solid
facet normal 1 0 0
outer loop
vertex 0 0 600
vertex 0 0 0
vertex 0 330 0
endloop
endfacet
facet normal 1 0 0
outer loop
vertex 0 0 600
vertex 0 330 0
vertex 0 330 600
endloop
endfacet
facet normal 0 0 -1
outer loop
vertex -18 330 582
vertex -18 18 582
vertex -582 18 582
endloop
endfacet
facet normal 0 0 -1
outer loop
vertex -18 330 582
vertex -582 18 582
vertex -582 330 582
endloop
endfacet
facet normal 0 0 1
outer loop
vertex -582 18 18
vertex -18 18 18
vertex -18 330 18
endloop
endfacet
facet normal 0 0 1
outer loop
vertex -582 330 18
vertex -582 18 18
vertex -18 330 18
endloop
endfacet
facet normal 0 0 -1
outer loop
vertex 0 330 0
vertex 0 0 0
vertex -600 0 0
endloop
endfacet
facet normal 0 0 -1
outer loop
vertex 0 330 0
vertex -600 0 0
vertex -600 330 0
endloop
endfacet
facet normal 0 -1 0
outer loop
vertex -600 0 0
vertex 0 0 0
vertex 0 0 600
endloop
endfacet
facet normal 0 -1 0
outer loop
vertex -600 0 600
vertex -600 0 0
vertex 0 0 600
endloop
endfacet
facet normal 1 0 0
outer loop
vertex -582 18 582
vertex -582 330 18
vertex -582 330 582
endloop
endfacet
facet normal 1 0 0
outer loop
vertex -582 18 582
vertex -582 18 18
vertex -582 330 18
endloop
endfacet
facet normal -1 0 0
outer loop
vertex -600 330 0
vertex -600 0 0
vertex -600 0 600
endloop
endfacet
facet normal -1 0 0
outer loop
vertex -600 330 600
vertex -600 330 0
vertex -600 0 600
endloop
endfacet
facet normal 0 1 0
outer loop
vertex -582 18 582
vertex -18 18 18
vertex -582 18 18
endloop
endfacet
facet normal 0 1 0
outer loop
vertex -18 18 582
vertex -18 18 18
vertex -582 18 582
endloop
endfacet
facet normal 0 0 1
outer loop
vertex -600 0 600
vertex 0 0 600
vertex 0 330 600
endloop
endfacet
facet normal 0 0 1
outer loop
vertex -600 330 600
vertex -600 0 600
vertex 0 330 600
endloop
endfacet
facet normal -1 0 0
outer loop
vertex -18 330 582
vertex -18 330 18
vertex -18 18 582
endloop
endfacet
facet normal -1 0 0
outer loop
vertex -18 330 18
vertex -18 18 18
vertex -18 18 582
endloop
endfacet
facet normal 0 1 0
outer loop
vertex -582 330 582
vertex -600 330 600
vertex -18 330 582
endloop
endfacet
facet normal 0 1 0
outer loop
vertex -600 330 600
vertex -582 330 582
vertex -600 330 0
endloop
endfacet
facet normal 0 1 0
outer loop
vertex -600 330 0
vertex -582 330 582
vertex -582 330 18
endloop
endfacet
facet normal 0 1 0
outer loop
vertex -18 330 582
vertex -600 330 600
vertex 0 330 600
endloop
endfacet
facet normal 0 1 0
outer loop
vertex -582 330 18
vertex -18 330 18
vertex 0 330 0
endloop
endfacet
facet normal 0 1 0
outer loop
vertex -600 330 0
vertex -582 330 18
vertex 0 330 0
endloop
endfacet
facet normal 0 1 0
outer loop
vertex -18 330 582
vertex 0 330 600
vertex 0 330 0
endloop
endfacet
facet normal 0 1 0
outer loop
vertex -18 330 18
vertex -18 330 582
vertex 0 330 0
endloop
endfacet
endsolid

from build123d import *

# Parameters (mm, degrees)
F0_W     = 52.5068640709
F0_H     = 35.3771150112
F1_DEPTH = 330
F2_DEPTH = 600
F3_DEPTH = 600
F4_T     = -18


with BuildPart() as f1:
    # F0 (on Front) → F1 (new body)
    with BuildSketch(Plane.XZ):
        with Locations((-26.2534320354, 17.6885575056)):
            Rectangle(F0_W, F0_H)
    extrude(amount=-F1_DEPTH)

    # F2 (add): a face of the model
    f2_faces = [f1.faces().sort_by_distance(p)[0] for p in [
        (-26.2534320354, 165, 0),
    ]]
    extrude(f2_faces, amount=-F2_DEPTH)

    # F3 (add): a face of the model
    f3_faces = [f1.faces().sort_by_distance(p)[0] for p in [
        (0, 165, 300),
    ]]
    extrude(f3_faces, amount=-F3_DEPTH)

    # F4
    f4_openings = [f1.faces().sort_by_distance(p)[0] for p in [
        (-300, 330, 300),
    ]]
    offset(amount=F4_T, openings=f4_openings)


solid = f1.part
